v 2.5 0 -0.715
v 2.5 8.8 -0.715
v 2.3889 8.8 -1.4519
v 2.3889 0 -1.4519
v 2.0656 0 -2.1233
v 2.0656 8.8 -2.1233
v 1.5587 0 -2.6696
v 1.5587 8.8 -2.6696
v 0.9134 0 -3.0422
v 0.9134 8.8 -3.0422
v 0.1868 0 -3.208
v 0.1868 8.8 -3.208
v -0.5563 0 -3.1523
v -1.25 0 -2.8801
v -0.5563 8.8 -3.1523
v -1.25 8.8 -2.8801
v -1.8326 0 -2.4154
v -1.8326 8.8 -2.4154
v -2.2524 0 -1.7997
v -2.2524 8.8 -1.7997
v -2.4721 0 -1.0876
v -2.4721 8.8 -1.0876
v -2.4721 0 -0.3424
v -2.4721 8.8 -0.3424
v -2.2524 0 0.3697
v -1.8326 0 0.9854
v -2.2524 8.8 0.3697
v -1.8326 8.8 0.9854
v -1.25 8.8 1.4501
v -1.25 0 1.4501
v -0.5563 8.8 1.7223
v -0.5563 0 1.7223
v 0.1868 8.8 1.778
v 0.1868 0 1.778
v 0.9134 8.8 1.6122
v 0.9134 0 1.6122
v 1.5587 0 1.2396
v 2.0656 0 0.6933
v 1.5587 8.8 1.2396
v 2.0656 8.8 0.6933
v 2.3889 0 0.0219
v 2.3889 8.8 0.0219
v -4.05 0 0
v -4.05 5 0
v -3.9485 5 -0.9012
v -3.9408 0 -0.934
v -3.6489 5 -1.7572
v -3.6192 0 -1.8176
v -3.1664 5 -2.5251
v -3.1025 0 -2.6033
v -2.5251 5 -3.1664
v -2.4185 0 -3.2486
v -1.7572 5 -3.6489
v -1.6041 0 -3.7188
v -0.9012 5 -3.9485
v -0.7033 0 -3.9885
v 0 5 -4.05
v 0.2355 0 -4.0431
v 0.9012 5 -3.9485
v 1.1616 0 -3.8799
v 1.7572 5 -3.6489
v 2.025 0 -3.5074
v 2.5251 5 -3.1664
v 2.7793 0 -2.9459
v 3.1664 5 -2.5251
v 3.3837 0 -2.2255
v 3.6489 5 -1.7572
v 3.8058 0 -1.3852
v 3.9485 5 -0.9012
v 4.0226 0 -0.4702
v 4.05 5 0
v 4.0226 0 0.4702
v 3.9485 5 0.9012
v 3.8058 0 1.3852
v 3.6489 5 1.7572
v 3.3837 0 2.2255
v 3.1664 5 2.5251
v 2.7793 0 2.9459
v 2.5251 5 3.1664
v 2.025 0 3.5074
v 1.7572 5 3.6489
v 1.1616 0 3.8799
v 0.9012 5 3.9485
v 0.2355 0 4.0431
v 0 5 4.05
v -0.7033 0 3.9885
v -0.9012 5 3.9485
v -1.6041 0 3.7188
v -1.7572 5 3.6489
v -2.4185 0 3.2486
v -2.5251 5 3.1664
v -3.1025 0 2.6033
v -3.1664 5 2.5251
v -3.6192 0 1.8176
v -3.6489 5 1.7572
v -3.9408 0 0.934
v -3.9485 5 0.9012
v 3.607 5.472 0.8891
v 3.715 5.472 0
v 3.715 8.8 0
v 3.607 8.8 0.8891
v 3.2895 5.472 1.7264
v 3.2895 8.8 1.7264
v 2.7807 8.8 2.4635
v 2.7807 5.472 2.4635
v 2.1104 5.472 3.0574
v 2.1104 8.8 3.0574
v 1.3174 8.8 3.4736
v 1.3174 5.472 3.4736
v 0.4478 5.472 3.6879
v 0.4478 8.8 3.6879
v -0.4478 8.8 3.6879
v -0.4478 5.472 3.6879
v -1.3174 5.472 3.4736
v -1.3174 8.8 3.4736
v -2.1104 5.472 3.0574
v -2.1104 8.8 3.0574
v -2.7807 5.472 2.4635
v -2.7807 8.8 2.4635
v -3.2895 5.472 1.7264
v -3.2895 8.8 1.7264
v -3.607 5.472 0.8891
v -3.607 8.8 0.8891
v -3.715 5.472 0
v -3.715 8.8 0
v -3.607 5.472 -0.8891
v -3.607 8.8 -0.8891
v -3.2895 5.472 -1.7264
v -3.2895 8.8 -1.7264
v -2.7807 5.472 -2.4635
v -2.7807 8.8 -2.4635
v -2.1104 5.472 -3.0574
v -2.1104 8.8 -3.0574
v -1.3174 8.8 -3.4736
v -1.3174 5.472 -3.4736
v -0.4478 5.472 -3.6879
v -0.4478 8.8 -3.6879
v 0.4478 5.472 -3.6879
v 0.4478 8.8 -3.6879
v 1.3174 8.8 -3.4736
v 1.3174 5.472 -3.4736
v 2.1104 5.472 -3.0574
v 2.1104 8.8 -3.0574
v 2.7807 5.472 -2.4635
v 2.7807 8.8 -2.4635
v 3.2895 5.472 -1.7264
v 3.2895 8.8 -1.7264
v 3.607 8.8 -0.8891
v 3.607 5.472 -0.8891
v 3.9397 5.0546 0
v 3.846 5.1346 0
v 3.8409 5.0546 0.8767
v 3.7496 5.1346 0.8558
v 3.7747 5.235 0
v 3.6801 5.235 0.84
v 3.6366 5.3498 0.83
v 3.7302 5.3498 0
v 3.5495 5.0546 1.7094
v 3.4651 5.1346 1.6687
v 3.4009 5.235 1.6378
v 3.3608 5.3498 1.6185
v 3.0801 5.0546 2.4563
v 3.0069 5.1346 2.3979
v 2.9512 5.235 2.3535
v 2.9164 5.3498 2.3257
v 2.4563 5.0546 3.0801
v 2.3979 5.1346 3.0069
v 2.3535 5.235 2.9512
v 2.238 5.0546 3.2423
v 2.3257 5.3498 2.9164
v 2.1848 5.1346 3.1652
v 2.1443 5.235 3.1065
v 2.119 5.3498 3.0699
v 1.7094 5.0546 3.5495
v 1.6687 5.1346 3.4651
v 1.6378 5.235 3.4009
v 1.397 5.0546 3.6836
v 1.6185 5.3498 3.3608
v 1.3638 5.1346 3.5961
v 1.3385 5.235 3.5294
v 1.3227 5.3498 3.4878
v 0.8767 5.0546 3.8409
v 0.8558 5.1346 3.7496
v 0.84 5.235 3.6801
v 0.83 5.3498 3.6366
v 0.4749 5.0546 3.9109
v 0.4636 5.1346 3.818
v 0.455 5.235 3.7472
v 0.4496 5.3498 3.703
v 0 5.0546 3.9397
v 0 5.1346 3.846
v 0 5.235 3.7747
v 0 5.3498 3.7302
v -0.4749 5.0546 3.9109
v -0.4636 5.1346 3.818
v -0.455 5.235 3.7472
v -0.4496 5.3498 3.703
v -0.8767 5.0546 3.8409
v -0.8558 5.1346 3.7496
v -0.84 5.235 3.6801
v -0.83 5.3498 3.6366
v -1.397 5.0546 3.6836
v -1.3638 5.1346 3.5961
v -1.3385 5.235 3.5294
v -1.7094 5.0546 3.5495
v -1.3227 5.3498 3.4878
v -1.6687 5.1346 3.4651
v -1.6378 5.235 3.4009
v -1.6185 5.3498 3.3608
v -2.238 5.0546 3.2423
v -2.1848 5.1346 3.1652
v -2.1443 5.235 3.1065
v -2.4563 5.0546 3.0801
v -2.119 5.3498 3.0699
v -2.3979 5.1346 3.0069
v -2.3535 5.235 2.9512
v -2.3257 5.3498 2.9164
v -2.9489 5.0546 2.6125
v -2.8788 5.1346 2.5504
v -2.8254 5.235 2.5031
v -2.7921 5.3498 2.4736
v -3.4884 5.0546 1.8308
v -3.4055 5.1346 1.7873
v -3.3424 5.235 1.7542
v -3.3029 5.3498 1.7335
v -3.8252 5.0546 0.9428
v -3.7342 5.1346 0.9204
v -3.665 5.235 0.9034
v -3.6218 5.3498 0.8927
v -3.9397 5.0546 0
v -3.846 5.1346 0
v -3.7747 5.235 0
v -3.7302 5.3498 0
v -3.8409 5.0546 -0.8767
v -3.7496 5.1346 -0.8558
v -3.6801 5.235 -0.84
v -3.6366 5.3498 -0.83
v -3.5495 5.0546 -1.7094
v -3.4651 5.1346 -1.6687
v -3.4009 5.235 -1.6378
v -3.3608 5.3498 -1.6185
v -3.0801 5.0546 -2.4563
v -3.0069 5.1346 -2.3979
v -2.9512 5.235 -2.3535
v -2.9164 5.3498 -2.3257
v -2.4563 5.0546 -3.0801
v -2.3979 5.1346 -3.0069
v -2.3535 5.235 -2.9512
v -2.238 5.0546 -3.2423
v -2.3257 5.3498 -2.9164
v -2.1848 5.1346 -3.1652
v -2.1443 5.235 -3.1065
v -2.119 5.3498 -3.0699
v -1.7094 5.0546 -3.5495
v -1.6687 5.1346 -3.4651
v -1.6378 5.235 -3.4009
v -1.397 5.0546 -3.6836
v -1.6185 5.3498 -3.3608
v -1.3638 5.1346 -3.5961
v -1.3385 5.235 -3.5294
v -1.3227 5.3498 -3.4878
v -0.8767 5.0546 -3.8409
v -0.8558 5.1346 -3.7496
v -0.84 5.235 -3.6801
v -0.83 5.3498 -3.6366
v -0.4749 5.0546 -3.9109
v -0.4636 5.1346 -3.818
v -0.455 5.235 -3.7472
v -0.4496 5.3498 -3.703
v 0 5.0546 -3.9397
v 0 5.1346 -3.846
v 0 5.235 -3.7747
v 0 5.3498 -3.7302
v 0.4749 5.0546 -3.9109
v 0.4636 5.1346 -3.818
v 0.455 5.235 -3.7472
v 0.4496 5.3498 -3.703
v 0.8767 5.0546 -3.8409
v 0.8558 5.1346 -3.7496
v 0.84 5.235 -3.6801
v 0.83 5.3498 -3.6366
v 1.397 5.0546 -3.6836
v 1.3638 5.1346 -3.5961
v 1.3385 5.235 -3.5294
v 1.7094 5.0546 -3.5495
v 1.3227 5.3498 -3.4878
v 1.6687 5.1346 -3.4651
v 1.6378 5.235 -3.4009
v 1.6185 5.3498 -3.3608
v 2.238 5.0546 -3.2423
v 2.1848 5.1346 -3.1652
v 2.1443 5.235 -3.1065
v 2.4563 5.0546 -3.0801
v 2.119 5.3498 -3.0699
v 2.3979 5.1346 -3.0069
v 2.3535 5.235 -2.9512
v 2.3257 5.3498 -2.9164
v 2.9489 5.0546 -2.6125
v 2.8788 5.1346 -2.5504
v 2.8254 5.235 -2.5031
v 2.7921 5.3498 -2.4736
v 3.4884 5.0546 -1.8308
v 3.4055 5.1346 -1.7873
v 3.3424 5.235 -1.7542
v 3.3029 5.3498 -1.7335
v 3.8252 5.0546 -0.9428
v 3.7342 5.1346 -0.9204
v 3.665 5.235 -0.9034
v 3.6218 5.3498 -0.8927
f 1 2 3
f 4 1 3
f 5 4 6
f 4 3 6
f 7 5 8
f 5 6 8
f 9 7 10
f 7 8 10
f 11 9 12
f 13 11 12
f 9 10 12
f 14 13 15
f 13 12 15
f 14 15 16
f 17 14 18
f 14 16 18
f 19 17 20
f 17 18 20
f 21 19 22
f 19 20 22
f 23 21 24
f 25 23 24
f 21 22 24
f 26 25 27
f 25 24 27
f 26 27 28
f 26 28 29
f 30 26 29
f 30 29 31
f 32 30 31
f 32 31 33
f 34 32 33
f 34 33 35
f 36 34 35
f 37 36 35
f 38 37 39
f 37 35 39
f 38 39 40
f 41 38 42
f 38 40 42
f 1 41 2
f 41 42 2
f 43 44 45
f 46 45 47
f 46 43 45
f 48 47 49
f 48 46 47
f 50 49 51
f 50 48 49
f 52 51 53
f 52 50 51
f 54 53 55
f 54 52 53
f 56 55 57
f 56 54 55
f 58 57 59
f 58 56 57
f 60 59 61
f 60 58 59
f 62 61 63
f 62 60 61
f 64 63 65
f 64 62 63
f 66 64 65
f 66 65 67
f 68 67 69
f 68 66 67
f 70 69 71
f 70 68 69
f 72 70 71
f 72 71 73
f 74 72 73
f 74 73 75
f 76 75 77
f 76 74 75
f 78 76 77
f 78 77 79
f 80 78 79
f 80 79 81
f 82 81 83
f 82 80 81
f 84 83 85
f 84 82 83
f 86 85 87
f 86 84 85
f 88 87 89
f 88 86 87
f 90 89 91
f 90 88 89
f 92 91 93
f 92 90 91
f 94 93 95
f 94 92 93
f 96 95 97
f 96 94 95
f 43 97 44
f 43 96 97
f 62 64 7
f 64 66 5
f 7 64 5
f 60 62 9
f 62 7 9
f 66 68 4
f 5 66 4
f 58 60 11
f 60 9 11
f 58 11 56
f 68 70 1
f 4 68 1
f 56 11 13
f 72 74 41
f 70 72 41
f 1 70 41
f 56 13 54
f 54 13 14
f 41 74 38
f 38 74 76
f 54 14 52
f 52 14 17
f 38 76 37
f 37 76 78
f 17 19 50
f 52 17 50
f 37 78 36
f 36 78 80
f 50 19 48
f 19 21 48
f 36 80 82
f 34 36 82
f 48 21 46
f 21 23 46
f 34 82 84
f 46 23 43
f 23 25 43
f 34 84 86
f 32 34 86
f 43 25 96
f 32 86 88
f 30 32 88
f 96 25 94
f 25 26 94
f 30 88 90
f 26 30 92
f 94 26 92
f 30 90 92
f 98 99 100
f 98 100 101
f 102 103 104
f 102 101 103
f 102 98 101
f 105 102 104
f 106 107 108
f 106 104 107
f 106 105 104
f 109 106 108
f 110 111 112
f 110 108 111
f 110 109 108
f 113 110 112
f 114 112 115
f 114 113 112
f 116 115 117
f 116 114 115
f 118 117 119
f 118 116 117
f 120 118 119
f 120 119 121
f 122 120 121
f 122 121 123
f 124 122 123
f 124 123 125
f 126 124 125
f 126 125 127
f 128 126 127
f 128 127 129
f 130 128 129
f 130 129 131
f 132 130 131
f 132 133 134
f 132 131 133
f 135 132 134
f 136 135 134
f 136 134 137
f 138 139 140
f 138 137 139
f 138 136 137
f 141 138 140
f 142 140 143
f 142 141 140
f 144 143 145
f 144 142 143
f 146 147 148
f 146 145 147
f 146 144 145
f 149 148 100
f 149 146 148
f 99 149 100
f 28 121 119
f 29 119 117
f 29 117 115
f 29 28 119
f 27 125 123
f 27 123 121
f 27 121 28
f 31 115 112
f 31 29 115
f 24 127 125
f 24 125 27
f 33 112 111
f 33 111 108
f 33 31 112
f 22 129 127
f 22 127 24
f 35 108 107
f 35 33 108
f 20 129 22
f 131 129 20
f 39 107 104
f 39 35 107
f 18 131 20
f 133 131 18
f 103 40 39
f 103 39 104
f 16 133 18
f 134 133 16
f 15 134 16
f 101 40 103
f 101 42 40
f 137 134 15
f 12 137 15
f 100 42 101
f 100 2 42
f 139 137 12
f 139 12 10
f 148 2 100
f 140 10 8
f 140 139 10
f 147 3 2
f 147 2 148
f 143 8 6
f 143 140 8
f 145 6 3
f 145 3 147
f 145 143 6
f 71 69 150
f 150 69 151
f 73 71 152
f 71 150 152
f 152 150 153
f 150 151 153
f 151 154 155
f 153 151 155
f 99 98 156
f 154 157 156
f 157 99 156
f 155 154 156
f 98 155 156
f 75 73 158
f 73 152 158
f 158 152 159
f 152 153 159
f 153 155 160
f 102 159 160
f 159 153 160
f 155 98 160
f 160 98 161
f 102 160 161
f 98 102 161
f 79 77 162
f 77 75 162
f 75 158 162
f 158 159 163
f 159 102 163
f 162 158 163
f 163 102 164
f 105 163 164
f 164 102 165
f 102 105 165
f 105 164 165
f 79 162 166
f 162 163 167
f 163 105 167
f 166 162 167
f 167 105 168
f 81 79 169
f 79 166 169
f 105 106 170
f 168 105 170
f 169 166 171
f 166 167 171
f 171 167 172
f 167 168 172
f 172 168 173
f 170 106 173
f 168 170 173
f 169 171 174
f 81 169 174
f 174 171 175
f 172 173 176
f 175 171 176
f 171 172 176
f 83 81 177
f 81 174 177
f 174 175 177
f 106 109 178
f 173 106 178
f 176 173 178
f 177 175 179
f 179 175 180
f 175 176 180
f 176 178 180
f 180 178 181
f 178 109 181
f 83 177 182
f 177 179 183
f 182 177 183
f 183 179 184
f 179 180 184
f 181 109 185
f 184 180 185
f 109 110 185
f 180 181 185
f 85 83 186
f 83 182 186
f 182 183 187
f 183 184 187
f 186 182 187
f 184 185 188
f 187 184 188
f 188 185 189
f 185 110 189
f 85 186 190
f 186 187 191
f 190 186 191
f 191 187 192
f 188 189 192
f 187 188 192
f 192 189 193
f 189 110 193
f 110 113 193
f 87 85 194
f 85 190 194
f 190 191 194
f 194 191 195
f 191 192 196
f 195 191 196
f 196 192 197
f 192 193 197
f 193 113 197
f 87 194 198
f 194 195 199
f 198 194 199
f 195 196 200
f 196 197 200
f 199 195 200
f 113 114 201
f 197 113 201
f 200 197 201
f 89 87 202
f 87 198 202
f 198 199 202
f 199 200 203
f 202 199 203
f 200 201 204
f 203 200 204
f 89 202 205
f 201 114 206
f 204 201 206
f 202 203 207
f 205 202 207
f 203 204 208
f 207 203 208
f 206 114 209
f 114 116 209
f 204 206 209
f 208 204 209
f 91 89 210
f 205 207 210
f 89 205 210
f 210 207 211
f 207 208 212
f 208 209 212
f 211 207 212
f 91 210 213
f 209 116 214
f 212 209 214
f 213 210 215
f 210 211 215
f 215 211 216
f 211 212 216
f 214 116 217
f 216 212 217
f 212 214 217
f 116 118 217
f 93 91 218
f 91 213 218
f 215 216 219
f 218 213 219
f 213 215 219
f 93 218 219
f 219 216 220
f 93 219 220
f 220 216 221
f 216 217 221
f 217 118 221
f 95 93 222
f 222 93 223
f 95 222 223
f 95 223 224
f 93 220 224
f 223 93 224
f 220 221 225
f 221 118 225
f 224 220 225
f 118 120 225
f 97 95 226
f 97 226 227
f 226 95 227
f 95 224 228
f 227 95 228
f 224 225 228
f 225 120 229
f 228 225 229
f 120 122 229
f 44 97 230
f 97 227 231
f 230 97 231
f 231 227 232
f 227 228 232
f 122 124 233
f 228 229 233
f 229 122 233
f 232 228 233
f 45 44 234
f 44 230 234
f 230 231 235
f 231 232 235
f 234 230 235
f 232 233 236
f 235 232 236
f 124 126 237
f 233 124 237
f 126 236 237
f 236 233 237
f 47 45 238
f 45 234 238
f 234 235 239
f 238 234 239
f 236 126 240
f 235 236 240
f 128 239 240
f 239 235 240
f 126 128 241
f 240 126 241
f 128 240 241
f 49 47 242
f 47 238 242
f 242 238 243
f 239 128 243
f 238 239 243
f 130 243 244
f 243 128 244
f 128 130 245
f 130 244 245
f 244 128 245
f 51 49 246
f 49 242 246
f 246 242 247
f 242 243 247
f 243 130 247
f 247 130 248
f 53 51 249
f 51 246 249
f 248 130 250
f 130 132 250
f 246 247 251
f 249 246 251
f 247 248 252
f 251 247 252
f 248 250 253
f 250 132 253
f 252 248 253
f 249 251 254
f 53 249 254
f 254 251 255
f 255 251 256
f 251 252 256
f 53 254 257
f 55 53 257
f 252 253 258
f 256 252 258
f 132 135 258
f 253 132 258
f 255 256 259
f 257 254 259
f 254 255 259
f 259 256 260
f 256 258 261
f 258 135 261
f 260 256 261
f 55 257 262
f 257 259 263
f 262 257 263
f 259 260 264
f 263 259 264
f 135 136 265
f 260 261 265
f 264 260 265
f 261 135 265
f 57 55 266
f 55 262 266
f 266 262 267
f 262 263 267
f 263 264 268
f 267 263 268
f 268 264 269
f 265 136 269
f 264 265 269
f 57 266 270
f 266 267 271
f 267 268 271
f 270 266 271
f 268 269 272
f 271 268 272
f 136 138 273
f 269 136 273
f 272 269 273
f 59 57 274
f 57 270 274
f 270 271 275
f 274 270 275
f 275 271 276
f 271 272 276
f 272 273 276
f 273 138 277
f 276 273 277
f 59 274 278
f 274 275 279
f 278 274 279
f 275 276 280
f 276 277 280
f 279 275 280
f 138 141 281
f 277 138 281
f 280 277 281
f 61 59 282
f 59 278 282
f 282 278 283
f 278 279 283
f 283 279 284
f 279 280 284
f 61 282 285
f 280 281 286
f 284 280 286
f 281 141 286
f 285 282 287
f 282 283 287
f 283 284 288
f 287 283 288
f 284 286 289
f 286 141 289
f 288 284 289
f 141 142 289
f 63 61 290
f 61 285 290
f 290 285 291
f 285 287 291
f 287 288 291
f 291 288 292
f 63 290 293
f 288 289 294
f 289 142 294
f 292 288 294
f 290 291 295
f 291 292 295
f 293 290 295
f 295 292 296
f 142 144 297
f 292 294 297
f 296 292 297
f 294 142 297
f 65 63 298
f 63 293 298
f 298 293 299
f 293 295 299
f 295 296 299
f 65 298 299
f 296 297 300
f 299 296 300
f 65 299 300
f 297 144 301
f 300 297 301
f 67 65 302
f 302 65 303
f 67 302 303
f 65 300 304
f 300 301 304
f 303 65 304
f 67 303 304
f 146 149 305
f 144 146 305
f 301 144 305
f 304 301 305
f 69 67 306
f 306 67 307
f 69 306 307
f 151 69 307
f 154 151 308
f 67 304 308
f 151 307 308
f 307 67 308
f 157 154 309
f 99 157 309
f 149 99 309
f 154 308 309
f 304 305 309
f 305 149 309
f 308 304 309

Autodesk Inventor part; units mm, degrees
ref_plane "YZ Plane" through (0, 0, 0) normal (1, 0, 0) x (0, 1, 0)
ref_plane "XZ Plane" through (0, 0, 0) normal (0, 1, 0) x (-1, 0, 0)
ref_plane "XY Plane" through (0, 0, 0) normal (0, 0, 1) x (1, 0, 0)
sketch "Boceto1" plane through (0, 0, 0) normal (0, 1, 0) x (-1, 0, 0)
  circle A0 centre (0, 0) radius 4.05
  dimension "d0" = 8.1
extrude "Extrusión1" add sketch "Boceto1" along normal blind 5
sketch "Boceto2" plane through (0, 5, 0) normal (0, 1, 0) x (1, 0, 0)
  circle A0 centre (0, 0) radius 3.715
  dimension "d3" = 7.43
extrude "Extrusión2" add sketch "Boceto2" along normal blind 3.8
fillet "Empalme2" radius 0.5 1 edges at (-3.715, 5, 0)
sketch "Boceto14" plane through (0, 8.8, 0) normal (0, 1, 0) x (1, 0, 0)
  circle A0 centre (0, 0) radius 3.715 projected
  line L0 (0, 3.715) -> (0, 3.215)
  line L1 (0, 3.215) -> (0, 0.715)
  circle A1 centre (0, 0.715) radius 2.5
  dimension "d72" = 0.5
  dimension "d73" = 2.5
extrude "Extrusión7" cut sketch "Boceto14" against normal through all contours A1
equation "\"d23\" = 55deg"
equation "\"Boceto5_Pitch\" = 0.8"
equation "\"d45\" = 55deg"
equation "\"Boceto8_Pitch\" = 0.8"
properties part number "interior"
